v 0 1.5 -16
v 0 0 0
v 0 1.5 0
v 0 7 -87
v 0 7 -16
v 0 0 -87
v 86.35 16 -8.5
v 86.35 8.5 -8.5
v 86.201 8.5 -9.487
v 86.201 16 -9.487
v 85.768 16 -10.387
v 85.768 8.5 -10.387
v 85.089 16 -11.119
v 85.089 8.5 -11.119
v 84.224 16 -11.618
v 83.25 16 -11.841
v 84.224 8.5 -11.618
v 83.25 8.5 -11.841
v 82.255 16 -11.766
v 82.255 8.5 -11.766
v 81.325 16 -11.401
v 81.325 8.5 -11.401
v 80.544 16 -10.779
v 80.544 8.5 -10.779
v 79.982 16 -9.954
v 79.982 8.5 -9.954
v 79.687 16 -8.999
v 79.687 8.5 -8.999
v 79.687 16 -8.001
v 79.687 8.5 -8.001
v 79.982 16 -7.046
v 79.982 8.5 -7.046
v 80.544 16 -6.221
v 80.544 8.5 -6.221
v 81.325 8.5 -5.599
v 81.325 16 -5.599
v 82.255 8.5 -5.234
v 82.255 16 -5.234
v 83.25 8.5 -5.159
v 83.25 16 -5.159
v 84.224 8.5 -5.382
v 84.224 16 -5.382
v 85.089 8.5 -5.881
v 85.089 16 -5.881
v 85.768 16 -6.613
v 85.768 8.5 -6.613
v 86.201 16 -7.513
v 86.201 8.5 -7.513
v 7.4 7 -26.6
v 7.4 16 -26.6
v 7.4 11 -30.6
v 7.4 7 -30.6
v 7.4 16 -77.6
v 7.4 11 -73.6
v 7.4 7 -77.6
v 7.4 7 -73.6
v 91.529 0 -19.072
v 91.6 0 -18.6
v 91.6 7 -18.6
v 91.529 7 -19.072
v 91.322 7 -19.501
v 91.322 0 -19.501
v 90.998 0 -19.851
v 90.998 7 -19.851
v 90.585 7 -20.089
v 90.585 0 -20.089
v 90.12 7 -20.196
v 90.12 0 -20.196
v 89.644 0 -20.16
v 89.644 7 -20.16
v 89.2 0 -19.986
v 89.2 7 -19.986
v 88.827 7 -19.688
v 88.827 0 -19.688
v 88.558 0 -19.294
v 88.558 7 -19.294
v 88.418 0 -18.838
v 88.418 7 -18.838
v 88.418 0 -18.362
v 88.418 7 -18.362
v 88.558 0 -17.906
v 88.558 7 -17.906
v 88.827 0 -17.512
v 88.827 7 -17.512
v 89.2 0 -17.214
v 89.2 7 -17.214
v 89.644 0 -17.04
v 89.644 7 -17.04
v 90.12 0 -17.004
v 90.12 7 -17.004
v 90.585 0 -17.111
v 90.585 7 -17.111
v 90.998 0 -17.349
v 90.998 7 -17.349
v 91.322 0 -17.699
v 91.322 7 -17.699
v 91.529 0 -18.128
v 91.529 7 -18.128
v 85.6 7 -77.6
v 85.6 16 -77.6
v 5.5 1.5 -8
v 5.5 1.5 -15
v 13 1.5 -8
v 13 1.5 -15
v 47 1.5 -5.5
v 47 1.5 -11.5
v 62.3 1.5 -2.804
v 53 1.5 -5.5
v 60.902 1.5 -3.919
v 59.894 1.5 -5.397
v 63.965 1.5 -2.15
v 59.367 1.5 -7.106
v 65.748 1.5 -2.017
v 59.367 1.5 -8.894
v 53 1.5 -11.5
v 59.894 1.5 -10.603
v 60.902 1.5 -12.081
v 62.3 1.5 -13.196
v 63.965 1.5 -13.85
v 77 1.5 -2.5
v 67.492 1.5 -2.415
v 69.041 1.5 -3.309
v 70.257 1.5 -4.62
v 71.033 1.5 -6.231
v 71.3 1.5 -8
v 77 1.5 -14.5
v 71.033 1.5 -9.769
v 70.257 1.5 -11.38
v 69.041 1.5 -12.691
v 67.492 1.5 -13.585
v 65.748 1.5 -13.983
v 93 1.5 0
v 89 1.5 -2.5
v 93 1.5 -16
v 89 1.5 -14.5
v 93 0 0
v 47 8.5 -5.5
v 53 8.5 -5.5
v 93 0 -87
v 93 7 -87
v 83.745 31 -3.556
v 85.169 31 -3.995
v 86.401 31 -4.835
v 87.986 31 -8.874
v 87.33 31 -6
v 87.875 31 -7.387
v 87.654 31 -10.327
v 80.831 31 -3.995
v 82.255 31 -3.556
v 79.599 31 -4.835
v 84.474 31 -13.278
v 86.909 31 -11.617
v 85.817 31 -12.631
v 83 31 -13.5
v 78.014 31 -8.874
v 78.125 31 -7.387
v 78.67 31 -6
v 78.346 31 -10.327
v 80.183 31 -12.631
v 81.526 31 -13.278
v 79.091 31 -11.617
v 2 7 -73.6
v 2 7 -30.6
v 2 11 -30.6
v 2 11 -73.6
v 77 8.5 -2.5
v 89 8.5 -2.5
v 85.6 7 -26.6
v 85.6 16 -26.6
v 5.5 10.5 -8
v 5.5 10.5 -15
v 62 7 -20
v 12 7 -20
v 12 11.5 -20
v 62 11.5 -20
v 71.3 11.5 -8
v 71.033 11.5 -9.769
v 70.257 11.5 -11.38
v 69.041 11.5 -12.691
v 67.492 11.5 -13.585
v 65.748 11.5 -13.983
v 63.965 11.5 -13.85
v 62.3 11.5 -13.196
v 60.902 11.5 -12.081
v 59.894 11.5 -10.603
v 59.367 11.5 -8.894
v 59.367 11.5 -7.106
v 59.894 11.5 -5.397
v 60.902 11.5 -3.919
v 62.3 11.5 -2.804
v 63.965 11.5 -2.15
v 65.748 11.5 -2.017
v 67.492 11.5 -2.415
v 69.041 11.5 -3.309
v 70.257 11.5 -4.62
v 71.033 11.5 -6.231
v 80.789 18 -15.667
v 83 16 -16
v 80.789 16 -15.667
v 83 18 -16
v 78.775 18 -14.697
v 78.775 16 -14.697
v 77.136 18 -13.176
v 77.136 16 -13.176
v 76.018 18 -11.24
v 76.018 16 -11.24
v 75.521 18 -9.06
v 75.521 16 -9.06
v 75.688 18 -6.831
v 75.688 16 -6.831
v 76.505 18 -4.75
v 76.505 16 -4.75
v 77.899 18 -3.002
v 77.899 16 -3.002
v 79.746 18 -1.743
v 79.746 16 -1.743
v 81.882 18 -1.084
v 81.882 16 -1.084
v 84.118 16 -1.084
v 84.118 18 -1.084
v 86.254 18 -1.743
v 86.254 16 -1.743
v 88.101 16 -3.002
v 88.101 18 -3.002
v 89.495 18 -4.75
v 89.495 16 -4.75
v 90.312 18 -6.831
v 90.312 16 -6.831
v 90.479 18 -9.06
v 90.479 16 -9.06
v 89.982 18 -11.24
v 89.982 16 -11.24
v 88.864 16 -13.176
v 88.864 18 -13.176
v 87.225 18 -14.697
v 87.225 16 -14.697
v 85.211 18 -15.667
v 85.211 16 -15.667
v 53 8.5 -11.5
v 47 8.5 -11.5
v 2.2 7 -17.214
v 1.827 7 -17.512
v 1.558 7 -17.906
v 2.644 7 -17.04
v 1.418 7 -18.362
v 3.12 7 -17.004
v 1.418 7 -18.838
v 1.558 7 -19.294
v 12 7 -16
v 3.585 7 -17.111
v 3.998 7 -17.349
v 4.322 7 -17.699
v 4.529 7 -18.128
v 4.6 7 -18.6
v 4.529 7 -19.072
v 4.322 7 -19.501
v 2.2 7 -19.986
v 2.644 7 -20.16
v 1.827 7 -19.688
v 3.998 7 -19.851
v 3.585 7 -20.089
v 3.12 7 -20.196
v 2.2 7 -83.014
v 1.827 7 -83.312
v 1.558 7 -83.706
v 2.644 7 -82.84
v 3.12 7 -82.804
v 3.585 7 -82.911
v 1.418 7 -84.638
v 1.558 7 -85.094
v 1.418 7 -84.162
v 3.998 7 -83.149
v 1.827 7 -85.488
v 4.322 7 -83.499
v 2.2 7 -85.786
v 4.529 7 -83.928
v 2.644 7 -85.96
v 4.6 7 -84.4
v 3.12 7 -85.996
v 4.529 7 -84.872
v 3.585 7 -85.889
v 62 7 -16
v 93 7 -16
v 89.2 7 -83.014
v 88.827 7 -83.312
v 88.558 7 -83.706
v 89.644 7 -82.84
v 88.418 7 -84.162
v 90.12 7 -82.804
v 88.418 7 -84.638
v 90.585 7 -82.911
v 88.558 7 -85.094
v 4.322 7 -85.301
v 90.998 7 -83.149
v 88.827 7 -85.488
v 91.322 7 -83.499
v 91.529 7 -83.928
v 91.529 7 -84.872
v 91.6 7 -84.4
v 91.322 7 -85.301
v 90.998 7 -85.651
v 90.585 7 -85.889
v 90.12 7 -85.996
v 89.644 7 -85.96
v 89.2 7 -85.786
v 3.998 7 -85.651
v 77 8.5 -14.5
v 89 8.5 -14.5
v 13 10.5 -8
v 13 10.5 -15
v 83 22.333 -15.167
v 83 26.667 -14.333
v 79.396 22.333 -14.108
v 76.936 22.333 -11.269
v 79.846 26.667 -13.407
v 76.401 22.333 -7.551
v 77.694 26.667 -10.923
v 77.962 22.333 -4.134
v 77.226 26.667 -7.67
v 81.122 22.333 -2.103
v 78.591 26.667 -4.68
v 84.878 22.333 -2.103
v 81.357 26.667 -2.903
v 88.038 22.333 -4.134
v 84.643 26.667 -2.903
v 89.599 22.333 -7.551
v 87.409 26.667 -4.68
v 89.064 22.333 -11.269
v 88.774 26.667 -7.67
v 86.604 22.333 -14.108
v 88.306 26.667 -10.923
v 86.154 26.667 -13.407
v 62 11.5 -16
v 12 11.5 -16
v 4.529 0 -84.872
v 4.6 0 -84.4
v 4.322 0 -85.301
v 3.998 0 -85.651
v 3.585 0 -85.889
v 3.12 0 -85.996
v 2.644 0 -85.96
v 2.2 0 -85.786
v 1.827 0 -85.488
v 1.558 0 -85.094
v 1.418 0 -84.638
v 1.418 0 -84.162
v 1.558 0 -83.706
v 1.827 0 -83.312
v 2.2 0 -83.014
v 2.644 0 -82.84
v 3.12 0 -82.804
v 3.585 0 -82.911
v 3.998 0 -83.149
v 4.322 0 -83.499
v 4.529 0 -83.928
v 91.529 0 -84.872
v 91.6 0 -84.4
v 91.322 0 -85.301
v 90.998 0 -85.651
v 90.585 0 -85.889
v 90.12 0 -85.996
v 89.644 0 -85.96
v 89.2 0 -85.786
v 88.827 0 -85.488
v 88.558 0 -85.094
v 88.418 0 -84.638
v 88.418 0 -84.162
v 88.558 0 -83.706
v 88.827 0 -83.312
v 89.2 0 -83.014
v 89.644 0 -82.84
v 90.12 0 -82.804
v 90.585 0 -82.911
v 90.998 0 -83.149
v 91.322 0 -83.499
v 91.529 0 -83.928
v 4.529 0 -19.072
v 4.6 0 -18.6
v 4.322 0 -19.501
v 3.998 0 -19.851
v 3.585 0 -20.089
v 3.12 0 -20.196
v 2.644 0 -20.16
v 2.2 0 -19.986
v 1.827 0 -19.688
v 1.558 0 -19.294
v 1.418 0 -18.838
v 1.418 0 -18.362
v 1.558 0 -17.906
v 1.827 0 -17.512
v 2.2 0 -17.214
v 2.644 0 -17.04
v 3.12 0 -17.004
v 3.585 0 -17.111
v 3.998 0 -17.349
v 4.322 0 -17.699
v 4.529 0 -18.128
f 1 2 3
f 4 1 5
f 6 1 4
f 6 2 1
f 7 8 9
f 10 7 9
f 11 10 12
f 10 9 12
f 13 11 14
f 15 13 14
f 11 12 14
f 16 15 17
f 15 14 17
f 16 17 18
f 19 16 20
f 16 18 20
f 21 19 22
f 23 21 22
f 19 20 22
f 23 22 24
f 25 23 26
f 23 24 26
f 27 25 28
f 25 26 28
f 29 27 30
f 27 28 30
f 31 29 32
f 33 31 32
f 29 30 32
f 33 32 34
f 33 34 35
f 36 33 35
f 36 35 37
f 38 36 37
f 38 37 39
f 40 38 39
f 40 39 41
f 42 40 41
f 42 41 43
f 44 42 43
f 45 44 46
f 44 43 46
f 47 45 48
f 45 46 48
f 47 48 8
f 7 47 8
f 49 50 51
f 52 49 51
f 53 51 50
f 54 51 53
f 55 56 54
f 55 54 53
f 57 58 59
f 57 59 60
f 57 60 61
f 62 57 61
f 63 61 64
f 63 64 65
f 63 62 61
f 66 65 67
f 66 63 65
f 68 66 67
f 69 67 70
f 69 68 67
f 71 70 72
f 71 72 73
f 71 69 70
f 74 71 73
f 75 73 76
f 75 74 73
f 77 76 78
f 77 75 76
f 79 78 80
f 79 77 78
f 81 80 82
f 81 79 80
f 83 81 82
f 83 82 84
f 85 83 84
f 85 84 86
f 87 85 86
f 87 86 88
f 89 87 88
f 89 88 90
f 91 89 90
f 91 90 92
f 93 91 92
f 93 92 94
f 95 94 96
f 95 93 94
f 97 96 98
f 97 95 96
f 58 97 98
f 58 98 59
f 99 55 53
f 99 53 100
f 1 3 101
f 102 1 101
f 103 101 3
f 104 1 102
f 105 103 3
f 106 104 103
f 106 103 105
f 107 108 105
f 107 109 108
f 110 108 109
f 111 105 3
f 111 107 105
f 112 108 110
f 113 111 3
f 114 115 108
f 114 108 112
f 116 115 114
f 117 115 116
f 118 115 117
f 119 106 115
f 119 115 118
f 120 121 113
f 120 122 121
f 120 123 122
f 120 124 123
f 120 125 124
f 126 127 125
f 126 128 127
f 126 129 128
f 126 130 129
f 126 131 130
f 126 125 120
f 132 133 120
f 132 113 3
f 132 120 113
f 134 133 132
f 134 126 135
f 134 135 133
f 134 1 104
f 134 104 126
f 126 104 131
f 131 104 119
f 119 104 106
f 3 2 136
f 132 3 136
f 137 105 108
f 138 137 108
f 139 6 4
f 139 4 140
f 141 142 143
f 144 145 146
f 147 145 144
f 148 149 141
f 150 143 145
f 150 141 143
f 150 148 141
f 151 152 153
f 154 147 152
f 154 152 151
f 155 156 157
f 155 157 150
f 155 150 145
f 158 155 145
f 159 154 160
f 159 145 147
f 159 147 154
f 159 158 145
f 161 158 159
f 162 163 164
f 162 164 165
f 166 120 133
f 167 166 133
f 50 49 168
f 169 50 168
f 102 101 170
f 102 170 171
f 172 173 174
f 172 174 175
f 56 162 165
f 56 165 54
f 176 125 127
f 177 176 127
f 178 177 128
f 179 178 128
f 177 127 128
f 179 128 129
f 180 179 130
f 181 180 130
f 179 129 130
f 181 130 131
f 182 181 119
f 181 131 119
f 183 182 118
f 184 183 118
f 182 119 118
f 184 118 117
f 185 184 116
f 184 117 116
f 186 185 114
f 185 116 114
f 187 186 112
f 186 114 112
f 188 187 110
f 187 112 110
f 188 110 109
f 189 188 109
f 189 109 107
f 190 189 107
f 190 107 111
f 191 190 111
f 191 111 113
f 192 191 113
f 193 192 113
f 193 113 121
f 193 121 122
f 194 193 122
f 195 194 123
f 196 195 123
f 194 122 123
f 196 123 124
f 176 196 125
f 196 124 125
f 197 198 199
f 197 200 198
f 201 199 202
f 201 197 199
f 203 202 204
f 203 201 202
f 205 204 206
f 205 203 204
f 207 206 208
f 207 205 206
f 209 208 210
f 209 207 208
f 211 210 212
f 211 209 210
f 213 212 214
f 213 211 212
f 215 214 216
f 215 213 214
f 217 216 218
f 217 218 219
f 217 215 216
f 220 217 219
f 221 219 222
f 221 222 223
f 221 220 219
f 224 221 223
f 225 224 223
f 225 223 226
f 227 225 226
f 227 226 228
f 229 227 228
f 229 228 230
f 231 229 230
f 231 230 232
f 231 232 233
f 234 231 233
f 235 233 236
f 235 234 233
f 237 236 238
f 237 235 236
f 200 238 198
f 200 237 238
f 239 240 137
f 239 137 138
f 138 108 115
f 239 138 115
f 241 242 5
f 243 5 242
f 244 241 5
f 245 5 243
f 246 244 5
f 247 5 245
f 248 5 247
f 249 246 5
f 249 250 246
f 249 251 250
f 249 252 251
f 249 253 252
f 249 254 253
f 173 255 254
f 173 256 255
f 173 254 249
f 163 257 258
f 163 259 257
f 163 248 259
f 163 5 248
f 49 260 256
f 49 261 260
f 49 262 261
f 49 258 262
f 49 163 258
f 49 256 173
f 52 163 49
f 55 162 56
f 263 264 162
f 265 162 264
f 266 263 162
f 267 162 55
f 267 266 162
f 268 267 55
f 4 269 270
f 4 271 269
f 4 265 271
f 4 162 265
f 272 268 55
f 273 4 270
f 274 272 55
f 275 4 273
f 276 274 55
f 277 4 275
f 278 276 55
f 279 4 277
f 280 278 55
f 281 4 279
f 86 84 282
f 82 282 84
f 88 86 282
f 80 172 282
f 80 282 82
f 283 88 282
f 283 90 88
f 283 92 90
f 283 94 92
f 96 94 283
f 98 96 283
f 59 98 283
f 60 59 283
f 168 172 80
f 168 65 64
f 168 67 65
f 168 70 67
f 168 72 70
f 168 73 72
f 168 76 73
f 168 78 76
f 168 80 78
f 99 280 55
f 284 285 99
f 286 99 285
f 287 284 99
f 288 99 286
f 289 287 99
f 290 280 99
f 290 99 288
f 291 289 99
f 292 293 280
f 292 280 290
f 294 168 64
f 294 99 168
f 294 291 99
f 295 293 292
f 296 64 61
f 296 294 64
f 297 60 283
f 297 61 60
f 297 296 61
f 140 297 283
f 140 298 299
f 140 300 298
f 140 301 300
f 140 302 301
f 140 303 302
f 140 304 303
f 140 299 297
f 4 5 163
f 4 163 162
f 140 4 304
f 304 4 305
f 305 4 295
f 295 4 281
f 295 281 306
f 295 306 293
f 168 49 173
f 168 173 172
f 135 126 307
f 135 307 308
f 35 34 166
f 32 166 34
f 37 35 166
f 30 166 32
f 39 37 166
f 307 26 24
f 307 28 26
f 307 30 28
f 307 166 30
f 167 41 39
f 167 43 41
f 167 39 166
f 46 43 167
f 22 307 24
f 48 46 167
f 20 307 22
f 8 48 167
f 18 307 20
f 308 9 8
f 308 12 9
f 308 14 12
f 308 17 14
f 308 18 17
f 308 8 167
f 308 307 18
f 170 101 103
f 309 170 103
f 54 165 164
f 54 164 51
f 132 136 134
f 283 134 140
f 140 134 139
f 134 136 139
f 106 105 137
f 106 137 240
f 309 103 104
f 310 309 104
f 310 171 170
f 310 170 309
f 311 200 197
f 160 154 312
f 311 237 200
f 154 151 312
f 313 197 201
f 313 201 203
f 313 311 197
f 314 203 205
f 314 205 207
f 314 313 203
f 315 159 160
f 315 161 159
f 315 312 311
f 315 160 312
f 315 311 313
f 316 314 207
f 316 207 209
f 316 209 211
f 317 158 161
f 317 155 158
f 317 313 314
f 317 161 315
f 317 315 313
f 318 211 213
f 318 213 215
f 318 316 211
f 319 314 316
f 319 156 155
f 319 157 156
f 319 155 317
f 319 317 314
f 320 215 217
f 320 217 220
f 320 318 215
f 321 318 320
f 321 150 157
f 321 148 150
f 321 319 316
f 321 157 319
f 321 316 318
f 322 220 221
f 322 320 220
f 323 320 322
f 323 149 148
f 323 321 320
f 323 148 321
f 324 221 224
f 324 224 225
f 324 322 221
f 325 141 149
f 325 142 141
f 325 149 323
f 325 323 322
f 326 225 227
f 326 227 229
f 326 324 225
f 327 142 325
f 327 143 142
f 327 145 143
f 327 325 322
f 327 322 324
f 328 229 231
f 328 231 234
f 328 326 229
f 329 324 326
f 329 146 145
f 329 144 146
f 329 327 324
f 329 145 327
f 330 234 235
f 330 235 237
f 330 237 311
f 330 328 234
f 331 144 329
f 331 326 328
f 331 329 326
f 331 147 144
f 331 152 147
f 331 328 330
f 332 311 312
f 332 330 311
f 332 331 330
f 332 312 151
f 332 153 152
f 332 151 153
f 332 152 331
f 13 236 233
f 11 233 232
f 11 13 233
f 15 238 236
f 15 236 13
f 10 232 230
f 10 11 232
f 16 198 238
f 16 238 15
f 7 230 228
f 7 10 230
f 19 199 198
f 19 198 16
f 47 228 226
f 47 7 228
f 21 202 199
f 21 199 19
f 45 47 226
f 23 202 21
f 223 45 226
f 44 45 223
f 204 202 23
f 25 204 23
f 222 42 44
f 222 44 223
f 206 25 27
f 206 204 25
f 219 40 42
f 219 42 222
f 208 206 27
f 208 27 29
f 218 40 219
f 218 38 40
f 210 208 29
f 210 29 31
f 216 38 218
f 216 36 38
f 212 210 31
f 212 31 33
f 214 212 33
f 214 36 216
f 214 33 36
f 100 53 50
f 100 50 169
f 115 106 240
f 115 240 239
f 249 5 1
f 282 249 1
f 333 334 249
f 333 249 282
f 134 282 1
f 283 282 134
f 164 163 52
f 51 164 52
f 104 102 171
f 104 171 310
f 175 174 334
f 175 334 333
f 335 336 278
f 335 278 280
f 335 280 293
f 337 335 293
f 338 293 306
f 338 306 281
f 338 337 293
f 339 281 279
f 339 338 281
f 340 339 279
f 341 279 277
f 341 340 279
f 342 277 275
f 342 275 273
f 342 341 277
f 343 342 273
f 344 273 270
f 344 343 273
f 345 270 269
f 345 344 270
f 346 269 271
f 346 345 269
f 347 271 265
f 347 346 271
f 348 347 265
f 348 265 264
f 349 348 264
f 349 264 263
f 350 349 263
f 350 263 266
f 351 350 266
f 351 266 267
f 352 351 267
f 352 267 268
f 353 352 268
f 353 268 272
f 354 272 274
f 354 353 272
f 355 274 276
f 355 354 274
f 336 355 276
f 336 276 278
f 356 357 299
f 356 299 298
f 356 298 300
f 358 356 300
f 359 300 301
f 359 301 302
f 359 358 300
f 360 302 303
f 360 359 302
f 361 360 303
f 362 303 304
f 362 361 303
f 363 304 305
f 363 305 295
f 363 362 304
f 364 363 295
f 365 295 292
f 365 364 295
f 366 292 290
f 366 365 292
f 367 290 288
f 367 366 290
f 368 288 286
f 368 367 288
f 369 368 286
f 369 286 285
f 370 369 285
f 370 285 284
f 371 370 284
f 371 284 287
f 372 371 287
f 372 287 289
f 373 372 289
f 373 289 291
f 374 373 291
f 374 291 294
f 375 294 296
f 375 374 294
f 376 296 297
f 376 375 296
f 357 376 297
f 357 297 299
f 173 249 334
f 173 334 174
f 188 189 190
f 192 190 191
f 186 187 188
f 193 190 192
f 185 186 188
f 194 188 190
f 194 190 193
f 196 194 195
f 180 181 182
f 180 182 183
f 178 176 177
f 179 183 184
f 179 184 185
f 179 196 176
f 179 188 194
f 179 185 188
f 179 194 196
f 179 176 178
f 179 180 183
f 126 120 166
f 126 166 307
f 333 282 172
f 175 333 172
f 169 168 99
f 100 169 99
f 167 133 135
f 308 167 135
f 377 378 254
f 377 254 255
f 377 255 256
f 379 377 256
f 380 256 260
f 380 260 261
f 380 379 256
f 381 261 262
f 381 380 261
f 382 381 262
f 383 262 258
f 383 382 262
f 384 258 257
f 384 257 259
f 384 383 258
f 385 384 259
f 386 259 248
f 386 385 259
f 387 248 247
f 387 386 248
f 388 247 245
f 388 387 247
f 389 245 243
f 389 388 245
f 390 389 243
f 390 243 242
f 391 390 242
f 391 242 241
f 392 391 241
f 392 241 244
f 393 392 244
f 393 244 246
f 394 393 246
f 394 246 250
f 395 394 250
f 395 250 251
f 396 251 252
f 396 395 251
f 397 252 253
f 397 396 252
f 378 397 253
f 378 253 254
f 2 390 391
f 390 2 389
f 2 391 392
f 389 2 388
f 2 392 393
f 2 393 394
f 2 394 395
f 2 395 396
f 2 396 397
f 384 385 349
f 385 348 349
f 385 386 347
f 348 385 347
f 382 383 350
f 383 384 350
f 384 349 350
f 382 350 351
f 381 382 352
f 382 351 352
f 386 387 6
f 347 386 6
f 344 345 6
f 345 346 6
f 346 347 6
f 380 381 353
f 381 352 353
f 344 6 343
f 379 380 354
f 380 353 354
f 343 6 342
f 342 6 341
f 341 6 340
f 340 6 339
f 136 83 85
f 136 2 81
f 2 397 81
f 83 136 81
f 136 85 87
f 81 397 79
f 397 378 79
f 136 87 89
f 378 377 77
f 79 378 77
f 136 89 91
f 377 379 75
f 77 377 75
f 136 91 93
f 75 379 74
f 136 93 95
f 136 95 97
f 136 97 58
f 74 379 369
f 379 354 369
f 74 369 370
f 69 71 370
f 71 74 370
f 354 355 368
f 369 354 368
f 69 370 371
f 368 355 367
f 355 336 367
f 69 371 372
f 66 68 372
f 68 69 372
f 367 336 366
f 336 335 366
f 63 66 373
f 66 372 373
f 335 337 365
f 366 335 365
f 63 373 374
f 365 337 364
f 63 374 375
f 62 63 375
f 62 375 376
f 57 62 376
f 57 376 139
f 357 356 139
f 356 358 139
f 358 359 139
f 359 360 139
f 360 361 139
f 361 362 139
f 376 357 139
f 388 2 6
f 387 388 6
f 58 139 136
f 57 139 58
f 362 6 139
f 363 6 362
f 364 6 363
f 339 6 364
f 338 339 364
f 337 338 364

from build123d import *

# Parameters (mm, degrees)
SKETCH_1_W          = 93
SKETCH_1_H          = 87
SKETCH_1_R          = 1.6
EXTRUDE_1_DEPTH     = 7
SKETCH_3_W          = 93
SKETCH_3_H          = 16
CUT_EXTRUDE_1_DEPTH = 5.5
SKETCH_4_W          = 78.2
SKETCH_4_H          = 51
EXTRUDE_2_DEPTH     = 9
SKETCH_5_W          = 12
SKETCH_5_H          = 12
EXTRUDE_3_DEPTH     = 7
SKETCH_6_R          = 3.35
EXTRUDE_4_DEPTH     = 7.5
SKETCH1_W           = 5.4
SKETCH1_H           = 43
BOSS_EXTRUDE1_DEPTH = 4
SKETCH2_R           = 6
BOSS_EXTRUDE2_DEPTH = 10
SKETCH3_W           = 50
SKETCH3_H           = 4
BOSS_EXTRUDE3_DEPTH = 4.5
SKETCH4_W           = 7.5
SKETCH4_H           = 7
BOSS_EXTRUDE4_DEPTH = 9
SKETCH5_W           = 6
SKETCH5_H           = 6
BOSS_EXTRUDE5_DEPTH = 7


with BuildPart() as part:
    # Эскиз1 → Бобышка-Вытянуть1 (new body)
    with BuildSketch(Plane(origin=(0, 0, 0), x_dir=(1, 0, 0), z_dir=(0, 1, 0))):
        with Locations((46.5, 43.5)):
            Rectangle(SKETCH_1_W, SKETCH_1_H)
        with Locations((3, 84.4)):
            Circle(SKETCH_1_R, mode=Mode.SUBTRACT)
        with Locations((90, 84.4)):
            Circle(SKETCH_1_R, mode=Mode.SUBTRACT)
        with Locations((90, 18.6)):
            Circle(SKETCH_1_R, mode=Mode.SUBTRACT)
        with Locations((3, 18.6)):
            Circle(SKETCH_1_R, mode=Mode.SUBTRACT)
    extrude(amount=EXTRUDE_1_DEPTH)

    # Эскиз3 → Вырез-Вытянуть1 (cut)
    with BuildSketch(Plane(origin=(0, 7, 0), x_dir=(1, 0, 0), z_dir=(0, 1, 0))):
        with Locations((46.5, 8)):
            Rectangle(SKETCH_3_W, SKETCH_3_H)
    extrude(amount=-CUT_EXTRUDE_1_DEPTH, mode=Mode.SUBTRACT)

    # Эскиз4 → Бобышка-Вытянуть2 (add)
    with BuildSketch(Plane(origin=(0, 7, 0), x_dir=(1, 0, 0), z_dir=(0, 1, 0))):
        with Locations((46.5, 52.1)):
            Rectangle(SKETCH_4_W, SKETCH_4_H)
    extrude(amount=EXTRUDE_2_DEPTH)

    # Эскиз5 → Бобышка-Вытянуть3 (add)
    with BuildSketch(Plane(origin=(0, 1.5, 0), x_dir=(1, 0, 0), z_dir=(0, 1, 0))):
        with Locations((83, 8.5)):
            Rectangle(SKETCH_5_W, SKETCH_5_H)
    extrude(amount=EXTRUDE_3_DEPTH)

    # Эскиз6 → Бобышка-Вытянуть4 (add)
    with BuildSketch(Plane(origin=(0, 8.5, 0), x_dir=(1, 0, 0), z_dir=(0, 1, 0))):
        with Locations((83, 8.5)):
            Circle(SKETCH_6_R)
    extrude(amount=EXTRUDE_4_DEPTH)

    # Sketch1 → Boss-Extrude1 (add)
    with BuildSketch(Plane(origin=(0, 7, 0), x_dir=(1, 0, 0), z_dir=(0, 1, 0))):
        with Locations((4.7, 52.1)):
            Rectangle(SKETCH1_W, SKETCH1_H)
    extrude(amount=BOSS_EXTRUDE1_DEPTH)

    # Эскиз9 → Revolve1 (revolve)
    with BuildSketch(Plane.ZY.offset(-83)):
        Polygon((-8.5, 16), (-16, 16), (-16, 18), (-13.5, 31), (-8.5, 31), align=None)
    revolve(axis=Axis((83, 16, -8.5), (0, 1, 0)))

    # Sketch2 → Boss-Extrude2 (add)
    with BuildSketch(Plane(origin=(0, 1.5, 0), x_dir=(1, 0, 0), z_dir=(0, 1, 0))):
        with Locations((65.3, 8)):
            Circle(SKETCH2_R)
    extrude(amount=BOSS_EXTRUDE2_DEPTH)

    # Sketch3 → Boss-Extrude3 (add)
    with BuildSketch(Plane(origin=(0, 7, 0), x_dir=(1, 0, 0), z_dir=(0, 1, 0))):
        with Locations((37, 18)):
            Rectangle(SKETCH3_W, SKETCH3_H)
    extrude(amount=BOSS_EXTRUDE3_DEPTH)

    # Sketch4 → Boss-Extrude4 (add)
    with BuildSketch(Plane(origin=(0, 1.5, 0), x_dir=(1, 0, 0), z_dir=(0, 1, 0))):
        with Locations((9.25, 11.5)):
            Rectangle(SKETCH4_W, SKETCH4_H)
    extrude(amount=BOSS_EXTRUDE4_DEPTH)

    # Sketch5 → Boss-Extrude5 (add)
    with BuildSketch(Plane(origin=(0, 1.5, 0), x_dir=(1, 0, 0), z_dir=(0, 1, 0))):
        with Locations((50, 8.5)):
            Rectangle(SKETCH5_W, SKETCH5_H)
    extrude(amount=BOSS_EXTRUDE5_DEPTH)


solid = part.part
